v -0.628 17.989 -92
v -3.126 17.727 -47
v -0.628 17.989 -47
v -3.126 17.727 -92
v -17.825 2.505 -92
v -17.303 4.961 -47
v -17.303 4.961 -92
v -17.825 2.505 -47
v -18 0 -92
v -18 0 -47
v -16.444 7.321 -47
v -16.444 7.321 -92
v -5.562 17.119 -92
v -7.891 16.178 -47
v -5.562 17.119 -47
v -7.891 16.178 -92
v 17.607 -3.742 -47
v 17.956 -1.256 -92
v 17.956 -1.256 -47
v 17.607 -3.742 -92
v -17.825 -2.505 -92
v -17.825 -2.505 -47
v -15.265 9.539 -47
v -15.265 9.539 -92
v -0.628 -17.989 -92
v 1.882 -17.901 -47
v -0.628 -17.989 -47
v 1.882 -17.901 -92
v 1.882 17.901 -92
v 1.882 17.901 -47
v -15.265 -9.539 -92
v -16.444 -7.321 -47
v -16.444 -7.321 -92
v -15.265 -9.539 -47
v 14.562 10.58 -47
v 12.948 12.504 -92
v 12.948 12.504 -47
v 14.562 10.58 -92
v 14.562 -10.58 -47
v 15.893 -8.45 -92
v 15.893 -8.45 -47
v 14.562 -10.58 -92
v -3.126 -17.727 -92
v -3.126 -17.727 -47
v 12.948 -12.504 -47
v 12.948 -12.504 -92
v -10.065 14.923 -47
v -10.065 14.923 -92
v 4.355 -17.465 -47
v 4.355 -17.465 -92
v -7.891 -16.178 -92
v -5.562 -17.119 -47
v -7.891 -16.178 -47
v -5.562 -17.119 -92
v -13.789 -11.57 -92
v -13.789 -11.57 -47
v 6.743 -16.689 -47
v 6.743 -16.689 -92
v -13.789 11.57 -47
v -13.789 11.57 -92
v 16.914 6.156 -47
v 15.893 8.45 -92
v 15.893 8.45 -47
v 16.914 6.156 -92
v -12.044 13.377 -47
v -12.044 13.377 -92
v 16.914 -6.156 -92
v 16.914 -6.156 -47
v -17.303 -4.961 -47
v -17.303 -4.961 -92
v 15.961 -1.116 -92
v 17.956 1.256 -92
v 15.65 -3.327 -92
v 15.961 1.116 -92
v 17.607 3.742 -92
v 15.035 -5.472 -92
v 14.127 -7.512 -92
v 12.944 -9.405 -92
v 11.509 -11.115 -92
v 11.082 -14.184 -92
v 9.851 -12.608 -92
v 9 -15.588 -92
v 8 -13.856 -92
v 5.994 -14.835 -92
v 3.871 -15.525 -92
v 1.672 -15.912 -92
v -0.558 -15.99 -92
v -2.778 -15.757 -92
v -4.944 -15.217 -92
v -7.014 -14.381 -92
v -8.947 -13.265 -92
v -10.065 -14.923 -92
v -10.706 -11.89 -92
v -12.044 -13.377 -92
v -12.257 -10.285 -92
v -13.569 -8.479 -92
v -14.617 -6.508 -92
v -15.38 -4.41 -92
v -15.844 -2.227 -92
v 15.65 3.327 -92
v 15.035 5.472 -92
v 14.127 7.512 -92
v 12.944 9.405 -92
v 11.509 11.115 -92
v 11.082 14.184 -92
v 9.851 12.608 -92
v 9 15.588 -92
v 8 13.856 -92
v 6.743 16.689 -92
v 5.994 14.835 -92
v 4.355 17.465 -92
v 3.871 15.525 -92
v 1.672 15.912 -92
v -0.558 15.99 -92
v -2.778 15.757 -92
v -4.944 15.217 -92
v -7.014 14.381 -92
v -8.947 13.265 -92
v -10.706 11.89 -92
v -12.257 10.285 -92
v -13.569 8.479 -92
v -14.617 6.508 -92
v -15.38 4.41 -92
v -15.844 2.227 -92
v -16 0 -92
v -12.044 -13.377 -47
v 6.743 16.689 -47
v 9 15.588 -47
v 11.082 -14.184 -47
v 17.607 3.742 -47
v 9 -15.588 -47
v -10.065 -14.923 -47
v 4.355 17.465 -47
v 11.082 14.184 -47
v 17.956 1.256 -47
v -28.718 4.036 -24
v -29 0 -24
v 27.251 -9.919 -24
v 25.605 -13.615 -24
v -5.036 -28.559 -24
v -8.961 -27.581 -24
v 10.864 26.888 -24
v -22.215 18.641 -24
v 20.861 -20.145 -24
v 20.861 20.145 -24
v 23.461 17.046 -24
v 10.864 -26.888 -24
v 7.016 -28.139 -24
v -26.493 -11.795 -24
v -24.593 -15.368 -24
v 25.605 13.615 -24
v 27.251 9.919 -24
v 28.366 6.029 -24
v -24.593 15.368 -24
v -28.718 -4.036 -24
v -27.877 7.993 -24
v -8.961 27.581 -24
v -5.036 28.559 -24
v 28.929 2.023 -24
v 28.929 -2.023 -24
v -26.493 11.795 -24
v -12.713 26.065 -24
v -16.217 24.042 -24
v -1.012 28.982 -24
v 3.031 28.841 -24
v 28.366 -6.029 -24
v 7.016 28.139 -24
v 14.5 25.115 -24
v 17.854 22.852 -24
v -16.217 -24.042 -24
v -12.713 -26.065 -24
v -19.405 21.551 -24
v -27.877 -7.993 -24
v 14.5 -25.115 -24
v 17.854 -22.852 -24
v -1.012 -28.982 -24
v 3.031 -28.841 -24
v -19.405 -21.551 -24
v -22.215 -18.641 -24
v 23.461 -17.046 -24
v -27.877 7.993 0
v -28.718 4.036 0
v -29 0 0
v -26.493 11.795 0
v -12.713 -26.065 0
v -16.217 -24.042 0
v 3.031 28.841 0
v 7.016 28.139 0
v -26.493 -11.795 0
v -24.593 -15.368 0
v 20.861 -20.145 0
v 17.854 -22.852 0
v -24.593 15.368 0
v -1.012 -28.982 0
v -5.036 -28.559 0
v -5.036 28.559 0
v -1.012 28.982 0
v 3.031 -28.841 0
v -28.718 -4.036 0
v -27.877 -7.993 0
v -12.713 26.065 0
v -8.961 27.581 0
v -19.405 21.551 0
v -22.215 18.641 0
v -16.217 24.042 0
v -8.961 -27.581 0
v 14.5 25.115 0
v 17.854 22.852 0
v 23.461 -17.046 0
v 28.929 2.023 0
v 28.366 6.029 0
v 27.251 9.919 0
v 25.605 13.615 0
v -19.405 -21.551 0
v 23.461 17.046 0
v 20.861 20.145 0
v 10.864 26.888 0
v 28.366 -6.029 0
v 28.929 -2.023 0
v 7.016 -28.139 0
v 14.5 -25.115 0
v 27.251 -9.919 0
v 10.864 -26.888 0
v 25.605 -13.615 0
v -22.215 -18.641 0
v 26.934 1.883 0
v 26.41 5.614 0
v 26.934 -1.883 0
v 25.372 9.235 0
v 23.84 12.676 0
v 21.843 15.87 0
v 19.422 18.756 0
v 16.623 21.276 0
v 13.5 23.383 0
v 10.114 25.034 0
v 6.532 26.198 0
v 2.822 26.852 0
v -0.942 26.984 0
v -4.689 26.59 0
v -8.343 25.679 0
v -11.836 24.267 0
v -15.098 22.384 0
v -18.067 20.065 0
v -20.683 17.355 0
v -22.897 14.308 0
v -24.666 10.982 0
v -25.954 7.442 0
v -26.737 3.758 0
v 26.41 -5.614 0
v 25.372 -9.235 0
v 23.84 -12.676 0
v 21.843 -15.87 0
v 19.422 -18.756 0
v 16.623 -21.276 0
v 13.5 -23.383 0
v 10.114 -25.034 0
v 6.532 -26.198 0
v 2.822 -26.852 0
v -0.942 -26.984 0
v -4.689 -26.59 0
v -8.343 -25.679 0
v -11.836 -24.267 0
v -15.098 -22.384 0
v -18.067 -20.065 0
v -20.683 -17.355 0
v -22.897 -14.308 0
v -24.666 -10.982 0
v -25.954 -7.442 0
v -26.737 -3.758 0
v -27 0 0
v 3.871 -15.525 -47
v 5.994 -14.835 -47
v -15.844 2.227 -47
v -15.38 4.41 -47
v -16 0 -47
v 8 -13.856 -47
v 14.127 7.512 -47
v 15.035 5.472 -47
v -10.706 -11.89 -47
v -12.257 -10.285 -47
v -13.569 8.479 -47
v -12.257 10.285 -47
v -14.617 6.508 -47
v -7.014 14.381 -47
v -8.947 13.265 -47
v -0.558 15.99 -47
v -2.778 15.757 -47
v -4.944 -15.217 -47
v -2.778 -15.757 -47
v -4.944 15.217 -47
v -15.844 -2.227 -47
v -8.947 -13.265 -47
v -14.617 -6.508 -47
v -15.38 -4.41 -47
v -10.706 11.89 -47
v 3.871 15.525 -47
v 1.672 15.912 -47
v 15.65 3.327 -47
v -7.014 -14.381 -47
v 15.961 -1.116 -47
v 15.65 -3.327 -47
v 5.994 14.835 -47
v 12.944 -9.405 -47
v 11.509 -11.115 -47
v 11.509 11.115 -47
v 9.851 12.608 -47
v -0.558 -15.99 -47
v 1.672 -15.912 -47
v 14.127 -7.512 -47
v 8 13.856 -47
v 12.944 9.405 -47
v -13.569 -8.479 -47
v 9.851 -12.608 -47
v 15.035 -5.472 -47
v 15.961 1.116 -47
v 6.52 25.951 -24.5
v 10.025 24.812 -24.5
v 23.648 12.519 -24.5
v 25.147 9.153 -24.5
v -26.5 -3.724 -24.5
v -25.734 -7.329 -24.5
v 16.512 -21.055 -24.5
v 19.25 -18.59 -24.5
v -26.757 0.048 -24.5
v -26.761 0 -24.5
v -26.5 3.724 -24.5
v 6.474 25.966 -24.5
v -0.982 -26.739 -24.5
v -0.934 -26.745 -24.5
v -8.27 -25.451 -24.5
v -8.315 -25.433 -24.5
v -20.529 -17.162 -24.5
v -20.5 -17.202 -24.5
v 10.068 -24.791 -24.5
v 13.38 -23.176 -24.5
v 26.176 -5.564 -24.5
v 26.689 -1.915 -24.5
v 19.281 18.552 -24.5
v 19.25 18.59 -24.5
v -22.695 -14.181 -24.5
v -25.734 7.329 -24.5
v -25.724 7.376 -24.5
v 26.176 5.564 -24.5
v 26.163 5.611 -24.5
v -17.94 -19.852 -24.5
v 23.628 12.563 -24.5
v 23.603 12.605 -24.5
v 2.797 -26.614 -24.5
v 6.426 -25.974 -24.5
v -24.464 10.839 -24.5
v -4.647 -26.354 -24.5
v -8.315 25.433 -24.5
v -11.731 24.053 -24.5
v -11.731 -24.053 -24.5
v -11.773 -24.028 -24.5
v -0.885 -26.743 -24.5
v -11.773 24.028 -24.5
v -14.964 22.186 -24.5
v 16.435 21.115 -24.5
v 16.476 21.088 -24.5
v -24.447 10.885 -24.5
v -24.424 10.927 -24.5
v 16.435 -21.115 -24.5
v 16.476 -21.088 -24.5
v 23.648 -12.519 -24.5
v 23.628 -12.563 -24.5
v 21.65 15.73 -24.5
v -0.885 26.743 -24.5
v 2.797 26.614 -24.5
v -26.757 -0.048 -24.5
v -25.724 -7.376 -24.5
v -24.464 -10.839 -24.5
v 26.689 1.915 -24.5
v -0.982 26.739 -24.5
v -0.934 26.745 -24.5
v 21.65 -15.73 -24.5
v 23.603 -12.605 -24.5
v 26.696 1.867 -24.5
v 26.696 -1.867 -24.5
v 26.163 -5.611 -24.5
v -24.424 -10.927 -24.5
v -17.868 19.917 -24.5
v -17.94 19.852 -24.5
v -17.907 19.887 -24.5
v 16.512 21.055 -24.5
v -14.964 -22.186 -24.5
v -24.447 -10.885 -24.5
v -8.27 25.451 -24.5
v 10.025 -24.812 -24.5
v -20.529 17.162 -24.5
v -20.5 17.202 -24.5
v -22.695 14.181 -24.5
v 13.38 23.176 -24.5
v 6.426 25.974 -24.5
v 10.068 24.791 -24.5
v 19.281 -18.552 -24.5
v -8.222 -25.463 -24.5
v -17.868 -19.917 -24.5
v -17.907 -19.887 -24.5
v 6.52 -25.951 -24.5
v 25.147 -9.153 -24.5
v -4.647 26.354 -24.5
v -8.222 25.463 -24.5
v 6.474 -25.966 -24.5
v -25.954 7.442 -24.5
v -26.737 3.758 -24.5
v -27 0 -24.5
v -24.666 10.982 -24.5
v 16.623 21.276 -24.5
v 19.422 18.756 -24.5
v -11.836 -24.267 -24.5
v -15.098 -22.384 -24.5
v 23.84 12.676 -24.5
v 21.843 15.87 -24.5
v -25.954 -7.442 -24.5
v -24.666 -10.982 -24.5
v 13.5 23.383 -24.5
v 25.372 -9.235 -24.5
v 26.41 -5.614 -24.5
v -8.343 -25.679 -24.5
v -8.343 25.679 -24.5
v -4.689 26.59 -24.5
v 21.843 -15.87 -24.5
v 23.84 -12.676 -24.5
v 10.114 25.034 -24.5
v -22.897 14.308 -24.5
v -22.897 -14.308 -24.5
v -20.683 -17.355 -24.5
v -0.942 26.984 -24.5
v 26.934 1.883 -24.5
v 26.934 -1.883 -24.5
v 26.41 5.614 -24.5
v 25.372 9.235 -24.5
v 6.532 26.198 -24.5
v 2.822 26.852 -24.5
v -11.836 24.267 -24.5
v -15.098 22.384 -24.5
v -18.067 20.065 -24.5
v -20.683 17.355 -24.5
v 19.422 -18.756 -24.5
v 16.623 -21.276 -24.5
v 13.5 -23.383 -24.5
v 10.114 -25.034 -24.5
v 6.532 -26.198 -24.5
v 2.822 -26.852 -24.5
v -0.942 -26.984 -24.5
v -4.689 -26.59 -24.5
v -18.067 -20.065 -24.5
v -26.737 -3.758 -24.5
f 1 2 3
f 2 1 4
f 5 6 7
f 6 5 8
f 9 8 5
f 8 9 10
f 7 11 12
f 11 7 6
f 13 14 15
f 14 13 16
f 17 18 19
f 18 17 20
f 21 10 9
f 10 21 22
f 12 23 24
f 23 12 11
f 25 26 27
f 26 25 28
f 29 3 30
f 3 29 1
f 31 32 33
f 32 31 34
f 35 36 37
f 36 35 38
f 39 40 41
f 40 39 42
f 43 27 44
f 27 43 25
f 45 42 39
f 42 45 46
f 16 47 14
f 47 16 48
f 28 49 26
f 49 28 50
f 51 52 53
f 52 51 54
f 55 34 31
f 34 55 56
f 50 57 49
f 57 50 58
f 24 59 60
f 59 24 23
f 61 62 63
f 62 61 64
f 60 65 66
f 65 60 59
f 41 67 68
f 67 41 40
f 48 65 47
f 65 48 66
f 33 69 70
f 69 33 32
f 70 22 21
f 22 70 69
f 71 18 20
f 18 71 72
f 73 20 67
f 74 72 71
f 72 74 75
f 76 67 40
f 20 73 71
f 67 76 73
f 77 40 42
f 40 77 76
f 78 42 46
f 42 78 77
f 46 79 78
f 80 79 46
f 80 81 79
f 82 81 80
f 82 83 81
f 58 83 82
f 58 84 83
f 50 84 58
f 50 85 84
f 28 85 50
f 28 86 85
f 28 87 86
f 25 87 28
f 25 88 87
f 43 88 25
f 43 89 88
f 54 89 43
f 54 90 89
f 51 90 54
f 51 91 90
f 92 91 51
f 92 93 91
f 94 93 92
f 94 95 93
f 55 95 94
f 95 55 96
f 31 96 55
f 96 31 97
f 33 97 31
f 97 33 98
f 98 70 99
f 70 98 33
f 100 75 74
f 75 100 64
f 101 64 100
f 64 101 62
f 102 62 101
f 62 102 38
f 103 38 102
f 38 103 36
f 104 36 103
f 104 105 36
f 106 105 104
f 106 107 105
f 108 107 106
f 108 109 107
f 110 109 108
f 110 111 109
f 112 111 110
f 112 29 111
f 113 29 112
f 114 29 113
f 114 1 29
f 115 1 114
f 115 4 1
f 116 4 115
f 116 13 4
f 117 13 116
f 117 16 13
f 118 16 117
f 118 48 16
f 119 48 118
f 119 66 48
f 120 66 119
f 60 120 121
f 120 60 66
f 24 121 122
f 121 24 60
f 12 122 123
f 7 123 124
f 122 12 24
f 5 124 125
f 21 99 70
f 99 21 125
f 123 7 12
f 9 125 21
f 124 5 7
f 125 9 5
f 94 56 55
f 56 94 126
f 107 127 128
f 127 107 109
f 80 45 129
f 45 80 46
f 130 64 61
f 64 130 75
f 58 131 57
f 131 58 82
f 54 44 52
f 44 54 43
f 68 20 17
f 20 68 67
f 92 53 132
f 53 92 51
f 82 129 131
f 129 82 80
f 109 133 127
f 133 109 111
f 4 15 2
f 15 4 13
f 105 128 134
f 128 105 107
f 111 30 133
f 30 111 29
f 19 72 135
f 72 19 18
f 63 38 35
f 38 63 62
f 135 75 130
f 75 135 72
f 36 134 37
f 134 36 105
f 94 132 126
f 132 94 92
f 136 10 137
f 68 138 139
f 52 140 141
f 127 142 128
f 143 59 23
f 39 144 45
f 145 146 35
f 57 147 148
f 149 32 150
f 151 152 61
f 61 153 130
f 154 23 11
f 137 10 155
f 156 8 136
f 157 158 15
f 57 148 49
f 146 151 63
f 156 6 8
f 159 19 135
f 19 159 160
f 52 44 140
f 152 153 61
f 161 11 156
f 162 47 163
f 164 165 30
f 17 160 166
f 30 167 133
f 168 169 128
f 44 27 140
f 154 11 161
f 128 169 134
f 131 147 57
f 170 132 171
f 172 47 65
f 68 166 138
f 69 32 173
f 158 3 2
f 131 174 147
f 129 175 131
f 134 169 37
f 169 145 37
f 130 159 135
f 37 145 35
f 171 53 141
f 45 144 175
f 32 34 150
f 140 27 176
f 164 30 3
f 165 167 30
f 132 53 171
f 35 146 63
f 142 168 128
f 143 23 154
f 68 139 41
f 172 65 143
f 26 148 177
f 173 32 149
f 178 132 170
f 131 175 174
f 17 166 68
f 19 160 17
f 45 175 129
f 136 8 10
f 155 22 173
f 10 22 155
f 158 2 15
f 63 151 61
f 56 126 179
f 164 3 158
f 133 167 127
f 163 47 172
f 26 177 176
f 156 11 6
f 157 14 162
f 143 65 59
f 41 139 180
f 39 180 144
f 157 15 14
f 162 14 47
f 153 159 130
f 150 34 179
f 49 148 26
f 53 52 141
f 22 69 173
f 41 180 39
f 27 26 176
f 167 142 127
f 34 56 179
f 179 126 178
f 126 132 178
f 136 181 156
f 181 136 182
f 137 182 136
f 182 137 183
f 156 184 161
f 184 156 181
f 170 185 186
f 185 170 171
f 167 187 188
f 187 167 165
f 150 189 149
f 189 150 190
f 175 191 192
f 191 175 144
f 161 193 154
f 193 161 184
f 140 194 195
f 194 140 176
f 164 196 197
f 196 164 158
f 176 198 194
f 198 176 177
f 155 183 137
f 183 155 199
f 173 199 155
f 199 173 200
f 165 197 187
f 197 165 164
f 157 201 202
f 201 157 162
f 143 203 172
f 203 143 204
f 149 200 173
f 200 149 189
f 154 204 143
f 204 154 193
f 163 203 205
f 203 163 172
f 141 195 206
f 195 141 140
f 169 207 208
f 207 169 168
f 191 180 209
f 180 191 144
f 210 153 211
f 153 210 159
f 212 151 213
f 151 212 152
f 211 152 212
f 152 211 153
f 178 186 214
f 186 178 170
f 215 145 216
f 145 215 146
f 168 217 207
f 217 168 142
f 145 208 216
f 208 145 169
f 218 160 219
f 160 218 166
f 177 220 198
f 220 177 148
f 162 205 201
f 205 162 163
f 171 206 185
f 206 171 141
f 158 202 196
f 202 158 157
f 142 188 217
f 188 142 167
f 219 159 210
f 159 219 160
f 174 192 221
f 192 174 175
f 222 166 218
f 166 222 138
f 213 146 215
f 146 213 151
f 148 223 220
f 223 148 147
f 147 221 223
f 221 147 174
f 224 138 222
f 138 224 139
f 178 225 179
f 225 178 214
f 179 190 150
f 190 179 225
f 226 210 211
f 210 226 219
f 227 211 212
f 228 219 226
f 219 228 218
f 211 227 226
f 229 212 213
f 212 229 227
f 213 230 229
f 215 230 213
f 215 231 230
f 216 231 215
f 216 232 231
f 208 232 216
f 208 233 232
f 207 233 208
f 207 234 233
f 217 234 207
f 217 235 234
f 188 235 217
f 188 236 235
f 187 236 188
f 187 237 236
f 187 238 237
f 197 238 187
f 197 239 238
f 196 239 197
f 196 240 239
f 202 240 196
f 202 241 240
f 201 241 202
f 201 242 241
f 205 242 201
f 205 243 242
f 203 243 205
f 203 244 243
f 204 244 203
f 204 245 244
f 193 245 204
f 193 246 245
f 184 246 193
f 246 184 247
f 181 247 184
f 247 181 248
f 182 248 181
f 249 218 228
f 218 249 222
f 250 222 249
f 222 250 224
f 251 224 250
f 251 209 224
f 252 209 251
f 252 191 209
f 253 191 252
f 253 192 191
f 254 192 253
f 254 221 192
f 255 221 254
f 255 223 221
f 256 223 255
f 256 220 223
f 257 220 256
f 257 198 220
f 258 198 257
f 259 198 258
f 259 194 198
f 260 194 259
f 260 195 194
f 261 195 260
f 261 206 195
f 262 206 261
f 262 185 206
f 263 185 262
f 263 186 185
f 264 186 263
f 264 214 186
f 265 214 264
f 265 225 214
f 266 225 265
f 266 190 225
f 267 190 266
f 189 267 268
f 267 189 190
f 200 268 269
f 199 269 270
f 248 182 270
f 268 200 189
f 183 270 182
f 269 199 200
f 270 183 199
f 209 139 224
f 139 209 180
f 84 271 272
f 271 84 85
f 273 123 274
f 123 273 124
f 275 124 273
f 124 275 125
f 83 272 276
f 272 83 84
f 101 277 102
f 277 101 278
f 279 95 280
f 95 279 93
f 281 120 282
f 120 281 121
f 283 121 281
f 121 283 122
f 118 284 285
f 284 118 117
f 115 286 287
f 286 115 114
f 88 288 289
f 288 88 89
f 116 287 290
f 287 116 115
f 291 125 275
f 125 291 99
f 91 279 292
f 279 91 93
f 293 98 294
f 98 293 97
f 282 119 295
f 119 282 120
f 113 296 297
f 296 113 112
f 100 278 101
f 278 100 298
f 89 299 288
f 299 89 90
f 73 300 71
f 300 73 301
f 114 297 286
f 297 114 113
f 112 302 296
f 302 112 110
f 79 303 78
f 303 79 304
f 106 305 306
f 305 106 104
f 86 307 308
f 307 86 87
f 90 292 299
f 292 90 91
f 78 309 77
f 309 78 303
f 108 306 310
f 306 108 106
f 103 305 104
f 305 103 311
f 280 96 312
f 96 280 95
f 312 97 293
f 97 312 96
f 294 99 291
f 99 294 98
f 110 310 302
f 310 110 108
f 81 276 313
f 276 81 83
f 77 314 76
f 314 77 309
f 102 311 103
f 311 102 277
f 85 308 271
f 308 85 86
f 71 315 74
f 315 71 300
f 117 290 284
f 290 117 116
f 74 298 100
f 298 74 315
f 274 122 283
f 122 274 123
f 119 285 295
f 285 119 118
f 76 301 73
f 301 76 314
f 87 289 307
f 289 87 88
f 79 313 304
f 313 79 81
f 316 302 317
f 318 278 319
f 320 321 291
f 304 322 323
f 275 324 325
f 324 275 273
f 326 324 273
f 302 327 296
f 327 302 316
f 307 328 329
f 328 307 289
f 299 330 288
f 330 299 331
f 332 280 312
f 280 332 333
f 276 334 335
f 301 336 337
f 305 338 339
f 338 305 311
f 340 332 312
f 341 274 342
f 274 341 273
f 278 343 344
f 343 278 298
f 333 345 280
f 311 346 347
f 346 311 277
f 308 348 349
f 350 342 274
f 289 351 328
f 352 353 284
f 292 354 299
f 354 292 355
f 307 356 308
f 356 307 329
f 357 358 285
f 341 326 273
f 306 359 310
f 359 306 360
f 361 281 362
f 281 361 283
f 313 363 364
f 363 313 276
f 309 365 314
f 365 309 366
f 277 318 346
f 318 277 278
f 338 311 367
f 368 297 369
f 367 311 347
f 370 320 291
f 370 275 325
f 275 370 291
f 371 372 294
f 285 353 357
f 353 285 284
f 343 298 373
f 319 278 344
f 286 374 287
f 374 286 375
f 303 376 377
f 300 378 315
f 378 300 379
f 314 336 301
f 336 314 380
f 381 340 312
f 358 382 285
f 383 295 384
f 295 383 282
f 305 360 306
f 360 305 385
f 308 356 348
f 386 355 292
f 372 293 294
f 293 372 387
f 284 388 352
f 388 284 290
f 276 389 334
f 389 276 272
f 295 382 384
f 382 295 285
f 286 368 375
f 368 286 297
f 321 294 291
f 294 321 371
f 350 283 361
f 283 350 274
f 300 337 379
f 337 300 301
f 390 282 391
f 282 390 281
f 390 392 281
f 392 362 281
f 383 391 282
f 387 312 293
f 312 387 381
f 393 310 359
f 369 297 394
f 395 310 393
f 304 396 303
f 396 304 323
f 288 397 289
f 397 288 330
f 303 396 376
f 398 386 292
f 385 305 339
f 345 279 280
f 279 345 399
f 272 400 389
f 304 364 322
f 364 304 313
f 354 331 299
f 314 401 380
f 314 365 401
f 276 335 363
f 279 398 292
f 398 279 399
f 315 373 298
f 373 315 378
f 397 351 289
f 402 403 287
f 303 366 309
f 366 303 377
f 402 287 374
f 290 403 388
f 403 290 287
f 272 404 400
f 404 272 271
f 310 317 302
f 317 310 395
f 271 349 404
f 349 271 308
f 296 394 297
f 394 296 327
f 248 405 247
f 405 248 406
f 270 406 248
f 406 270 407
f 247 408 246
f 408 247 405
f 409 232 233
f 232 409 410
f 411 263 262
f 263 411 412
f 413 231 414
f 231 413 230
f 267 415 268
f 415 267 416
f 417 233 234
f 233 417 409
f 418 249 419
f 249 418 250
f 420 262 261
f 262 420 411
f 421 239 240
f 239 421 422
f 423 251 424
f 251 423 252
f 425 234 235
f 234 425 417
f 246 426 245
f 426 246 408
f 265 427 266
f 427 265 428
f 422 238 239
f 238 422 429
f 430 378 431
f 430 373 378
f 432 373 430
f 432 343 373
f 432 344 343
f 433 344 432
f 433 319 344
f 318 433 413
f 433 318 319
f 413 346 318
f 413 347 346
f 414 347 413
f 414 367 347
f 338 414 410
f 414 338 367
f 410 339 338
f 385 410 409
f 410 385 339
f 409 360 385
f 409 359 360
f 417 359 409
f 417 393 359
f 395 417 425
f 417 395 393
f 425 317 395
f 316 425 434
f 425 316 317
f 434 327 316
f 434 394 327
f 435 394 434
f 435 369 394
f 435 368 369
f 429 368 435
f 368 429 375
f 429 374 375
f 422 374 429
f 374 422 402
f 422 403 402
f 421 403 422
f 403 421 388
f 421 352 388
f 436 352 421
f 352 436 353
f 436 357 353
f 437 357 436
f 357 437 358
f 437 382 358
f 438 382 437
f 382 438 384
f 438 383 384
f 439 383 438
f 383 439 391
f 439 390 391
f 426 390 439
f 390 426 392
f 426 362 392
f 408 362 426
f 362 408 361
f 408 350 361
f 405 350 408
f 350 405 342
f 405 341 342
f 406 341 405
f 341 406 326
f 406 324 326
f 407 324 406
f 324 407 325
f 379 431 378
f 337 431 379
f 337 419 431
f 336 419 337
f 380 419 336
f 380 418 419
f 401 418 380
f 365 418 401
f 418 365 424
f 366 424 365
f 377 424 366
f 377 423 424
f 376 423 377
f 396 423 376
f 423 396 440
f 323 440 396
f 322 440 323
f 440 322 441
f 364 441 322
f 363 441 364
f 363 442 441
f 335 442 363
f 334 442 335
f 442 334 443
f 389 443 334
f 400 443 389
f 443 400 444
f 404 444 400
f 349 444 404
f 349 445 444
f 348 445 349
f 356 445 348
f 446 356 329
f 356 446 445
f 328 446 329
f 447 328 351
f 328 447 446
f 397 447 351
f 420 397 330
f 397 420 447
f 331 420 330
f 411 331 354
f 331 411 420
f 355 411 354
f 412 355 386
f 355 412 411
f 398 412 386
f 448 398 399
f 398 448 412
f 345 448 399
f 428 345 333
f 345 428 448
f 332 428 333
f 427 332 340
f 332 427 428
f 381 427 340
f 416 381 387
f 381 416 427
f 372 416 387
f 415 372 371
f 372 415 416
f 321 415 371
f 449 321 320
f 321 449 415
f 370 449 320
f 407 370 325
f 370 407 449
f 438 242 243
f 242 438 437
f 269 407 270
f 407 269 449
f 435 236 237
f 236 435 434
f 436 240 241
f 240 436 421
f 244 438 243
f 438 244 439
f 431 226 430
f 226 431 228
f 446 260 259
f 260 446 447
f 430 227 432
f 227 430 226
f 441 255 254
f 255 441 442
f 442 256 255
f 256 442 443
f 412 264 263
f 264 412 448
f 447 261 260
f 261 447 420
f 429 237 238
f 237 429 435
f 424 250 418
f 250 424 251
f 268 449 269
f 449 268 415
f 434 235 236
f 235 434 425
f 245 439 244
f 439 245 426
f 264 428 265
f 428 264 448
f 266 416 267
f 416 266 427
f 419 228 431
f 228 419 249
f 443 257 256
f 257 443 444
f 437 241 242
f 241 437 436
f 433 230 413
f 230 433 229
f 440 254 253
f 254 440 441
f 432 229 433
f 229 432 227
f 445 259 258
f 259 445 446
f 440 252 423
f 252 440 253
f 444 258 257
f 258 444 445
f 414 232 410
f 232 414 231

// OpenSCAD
// [FL_INDEX: keywords="openscad, 3d_parametric, Customizable_Vacuum_Hose_adapter, csg_solid" | COT="Parametric OpenSCAD design from 3DCodeverse"]
// Title: Customizable Vacuum Hose adapter

//CUSTOMIZER VARIABLES


//How thick your walls are (in mm)
wallThickness = 2;

//The diameter inside the "small" end. Fits over the vacuum.
insideVacuum = 32;
//The length of the tube that fits over the vacuum.
vacuumLength = 45;

//The diameter of the outside of the "large" end. Fits inside something else
outsideBandsaw = 58;
//The length of the larger tube.
bandsawLength=24;

//CUSTOMIZER VARIABLES END

$fn=45;
rotate([0,180,0])
difference() {
  union() {
    translate([0,0,bandsawLength+(vacuumLength+bandsawLength)/3])
    cylinder(r=(insideVacuum/2)+wallThickness, h=vacuumLength);


    translate([0,0,bandsawLength])
    cylinder(r2=(insideVacuum/2)+wallThickness, r1=(outsideBandsaw/2),h=(vacuumLength+bandsawLength)/3);

  cylinder(r=(outsideBandsaw/2), h=bandsawLength);
 }

translate([0,0,bandsawLength+(vacuumLength+bandsawLength)/3-0.5])
#cylinder(r=(insideVacuum/2),h=vacuumLength+1);

  translate([0,0,bandsawLength])
   #cylinder(r2=(insideVacuum/2), r1=(outsideBandsaw/2)-wallThickness,h=(vacuumLength+bandsawLength)/3 );

translate([0,0,-0.5])
#cylinder(r=(outsideBandsaw/2)-wallThickness, h=bandsawLength+1);
 }
